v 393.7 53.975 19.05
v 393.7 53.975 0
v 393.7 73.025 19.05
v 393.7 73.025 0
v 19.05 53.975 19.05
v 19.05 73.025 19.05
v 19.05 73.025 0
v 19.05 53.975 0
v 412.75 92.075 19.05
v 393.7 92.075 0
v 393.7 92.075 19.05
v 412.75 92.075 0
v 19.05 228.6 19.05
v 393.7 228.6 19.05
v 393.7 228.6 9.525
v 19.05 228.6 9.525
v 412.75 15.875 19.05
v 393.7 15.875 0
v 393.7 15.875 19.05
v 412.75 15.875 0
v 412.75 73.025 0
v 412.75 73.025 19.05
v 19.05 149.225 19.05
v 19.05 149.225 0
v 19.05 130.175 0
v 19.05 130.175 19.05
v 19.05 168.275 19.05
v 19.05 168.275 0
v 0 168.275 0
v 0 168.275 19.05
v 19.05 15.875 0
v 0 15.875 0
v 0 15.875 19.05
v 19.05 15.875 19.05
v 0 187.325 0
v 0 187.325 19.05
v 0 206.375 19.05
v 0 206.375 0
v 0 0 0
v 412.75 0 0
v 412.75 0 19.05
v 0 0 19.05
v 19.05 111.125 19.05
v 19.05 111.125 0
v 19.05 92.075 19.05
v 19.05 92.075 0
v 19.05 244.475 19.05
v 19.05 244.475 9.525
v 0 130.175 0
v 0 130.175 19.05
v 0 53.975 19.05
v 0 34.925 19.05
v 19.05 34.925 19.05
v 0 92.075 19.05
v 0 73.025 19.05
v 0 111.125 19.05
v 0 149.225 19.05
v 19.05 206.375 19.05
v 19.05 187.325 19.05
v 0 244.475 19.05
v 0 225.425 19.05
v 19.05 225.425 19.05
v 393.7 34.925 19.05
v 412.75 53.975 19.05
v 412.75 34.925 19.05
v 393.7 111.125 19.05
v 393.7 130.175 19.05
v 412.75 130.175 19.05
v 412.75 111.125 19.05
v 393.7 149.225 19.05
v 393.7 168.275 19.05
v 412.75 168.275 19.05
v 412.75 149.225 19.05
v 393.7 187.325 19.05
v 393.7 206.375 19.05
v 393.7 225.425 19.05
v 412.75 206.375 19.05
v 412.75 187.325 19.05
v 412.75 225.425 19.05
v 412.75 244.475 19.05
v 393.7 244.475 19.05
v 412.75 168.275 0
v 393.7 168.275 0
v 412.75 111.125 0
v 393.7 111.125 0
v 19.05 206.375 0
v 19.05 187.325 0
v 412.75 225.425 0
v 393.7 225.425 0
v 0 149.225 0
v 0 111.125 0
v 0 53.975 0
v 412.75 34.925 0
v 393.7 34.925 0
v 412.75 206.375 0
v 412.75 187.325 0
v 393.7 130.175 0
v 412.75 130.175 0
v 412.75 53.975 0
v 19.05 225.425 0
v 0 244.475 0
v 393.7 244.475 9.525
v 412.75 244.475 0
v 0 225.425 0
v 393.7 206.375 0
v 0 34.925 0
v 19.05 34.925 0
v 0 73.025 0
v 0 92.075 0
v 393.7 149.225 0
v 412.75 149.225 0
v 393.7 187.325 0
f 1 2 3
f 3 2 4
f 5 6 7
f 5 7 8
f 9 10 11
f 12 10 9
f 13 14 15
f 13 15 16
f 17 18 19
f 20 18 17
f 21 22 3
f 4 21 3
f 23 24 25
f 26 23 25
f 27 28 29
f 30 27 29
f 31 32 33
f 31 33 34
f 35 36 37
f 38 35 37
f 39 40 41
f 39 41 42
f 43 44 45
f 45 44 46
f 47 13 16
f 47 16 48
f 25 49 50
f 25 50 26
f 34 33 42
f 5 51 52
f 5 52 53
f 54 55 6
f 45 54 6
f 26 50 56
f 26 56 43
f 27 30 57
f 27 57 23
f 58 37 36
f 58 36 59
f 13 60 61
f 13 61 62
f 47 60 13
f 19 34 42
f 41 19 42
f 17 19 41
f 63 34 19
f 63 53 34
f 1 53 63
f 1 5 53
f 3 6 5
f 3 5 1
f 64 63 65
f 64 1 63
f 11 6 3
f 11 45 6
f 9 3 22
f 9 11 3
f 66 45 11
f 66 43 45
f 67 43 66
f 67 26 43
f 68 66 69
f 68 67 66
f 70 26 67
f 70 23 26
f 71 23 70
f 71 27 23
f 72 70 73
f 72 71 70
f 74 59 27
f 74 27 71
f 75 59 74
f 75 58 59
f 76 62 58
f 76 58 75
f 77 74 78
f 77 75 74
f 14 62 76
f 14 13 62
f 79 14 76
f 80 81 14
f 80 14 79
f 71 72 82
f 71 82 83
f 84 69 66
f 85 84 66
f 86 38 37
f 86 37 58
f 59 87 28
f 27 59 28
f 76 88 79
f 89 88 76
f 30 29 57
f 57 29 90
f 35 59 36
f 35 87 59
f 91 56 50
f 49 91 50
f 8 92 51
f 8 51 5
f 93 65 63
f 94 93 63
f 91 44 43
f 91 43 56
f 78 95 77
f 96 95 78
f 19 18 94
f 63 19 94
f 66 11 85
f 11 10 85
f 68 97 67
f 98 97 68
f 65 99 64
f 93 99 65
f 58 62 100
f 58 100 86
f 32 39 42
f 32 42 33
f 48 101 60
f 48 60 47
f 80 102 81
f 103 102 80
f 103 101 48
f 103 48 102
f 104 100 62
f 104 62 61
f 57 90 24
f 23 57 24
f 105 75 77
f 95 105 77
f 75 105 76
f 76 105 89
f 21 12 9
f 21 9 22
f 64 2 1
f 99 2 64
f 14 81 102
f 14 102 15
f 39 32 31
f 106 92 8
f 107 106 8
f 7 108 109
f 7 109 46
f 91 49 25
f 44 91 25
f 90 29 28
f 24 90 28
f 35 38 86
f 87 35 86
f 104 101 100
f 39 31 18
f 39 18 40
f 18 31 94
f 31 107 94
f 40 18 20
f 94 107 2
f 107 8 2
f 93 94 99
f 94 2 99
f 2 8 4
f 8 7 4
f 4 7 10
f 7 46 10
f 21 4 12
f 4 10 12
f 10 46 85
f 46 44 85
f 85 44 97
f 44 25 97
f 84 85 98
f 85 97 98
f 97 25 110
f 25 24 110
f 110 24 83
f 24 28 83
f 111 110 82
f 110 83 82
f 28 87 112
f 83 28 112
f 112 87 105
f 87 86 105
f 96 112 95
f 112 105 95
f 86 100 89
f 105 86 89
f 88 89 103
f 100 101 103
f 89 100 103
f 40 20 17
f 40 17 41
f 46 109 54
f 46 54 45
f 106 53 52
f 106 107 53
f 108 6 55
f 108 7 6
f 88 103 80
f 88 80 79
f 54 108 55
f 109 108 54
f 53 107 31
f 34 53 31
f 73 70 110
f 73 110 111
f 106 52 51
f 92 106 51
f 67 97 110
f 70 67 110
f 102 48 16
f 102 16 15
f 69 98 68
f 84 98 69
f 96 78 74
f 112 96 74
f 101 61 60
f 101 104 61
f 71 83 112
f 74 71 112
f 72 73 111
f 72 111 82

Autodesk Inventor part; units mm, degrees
ref_plane "YZ Plane" through (0, 0, 0) normal (1, 0, 0) x (0, 1, 0)
ref_plane "XZ Plane" through (0, 0, 0) normal (0, 1, 0) x (-1, 0, 0)
ref_plane "XY Plane" through (0, 0, 0) normal (0, 0, 1) x (1, 0, 0)
sketch "Sketch1" plane through (0, 0, 0) normal (0, 0, 1) x (1, 0, 0)
  line L0 (0, 244.475) -> (19.05, 244.475)
  line L1 (19.05, 244.475) -> (19.05, 225.425)
  line L2 (19.05, 225.425) -> (0, 225.425)
  line L3 (0, 225.425) -> (0, 244.475)
  line L4 (19.05, 168.275) -> (0, 168.275)
  line L5 (0, 168.275) -> (0, 149.225)
  line L6 (0, 149.225) -> (19.05, 149.225)
  line L7 (19.05, 149.225) -> (19.05, 168.275)
  line L8 (0, 130.175) -> (19.05, 130.175)
  line L9 (19.05, 130.175) -> (19.05, 111.125)
  line L10 (19.05, 111.125) -> (0, 111.125)
  line L11 (0, 111.125) -> (0, 130.175)
  line L12 (0, 206.375) -> (19.05, 206.375)
  line L13 (19.05, 206.375) -> (19.05, 187.325)
  line L14 (19.05, 187.325) -> (0, 187.325)
  line L15 (0, 187.325) -> (0, 206.375)
  line L16 (0, 92.075) -> (19.05, 92.075)
  line L17 (19.05, 92.075) -> (19.05, 73.025)
  line L18 (19.05, 73.025) -> (0, 73.025)
  line L19 (0, 73.025) -> (0, 92.075)
  line L20 (0, 53.975) -> (19.05, 53.975)
  line L21 (19.05, 53.975) -> (19.05, 34.925)
  line L22 (19.05, 34.925) -> (0, 34.925)
  line L23 (0, 34.925) -> (0, 53.975)
  line L24 (0, 15.875) -> (19.05, 15.875)
  line L25 (19.05, 15.875) -> (19.05, -3.175)
  line L26 (19.05, -3.175) -> (0, -3.175)
  line L27 (0, -3.175) -> (0, 15.875)
  line L28 (0, 244.475) -> (206.375, 244.475)
  line L29 (206.375, 244.475) -> (206.375, 0)
  line L30 (206.375, 0) -> (0, 0)
  line L31 (19.05, 244.475) -> (19.05, 0)
  line L32 (206.375, 244.475) -> (19.05, 244.475)
  line L33 (19.05, 244.475) -> (19.05, 0)
  line L34 (19.05, 0) -> (206.375, 0)
  line L35 (206.375, 0) -> (206.375, 244.475)
  dimension "d0" = 19.05
  dimension "d1" = 19.05
  dimension "d3" = 19.05
  dimension "d4" = 19.05
  dimension "d5" = 19.05
  dimension "d6" = 19.05
  dimension "d7" = 19.05
  dimension "d8" = 19.05
  dimension "d9" = 19.05
  dimension "d10" = 19.05
  dimension "d11" = 19.05
  dimension "d12" = 19.05
  dimension "d13" = 19.05
  dimension "d14" = 19.05
  dimension "d15" = 19.05
  dimension "d16" = 19.05
  dimension "d17" = 19.05
  dimension "d18" = 19.05
  dimension "d19" = 19.05
  dimension "d21" = 206.375
  dimension "d22" = 244.475
  dimension "d23" = 206.375
extrude "Extrusion1" add sketch "Sketch1" along normal blind 19.05 contours L0 L1 L2 L3 | L28 L29 L30 L25 L31 L21 L17 L9 L7 L13 L1 | L13 L14 L15 L12 | L30 L27 L24 L25 | L7 L6 L5 L4 | L22 L23 L20 L21 | L9 L10 L11 L8 | L18 L19 L16 L17
mirror "Mirror1" about plane through (206.375, 0, 0) normal (1, 0, 0) of "Extrusion1"
sketch "Sketch2" plane through (0, 0, 19.05) normal (0, 0, 1) x (1, 0, 0)
  line L0 (412.75, 244.475) -> (412.75, 225.425) projected
  line L1 (0, 244.475) -> (412.75, 244.475) projected
  line L2 (0, 244.475) -> (0, 225.425) projected
  line L3 (19.05, 244.475) -> (393.7, 244.475)
  line L4 (393.7, 244.475) -> (393.7, 228.6)
  line L5 (393.7, 228.6) -> (19.05, 228.6)
  line L6 (19.05, 228.6) -> (19.05, 244.475)
  dimension "d26" = 19.05
  dimension "d27" = 19.05
  dimension "d28" = 15.875
extrude "Extrusion2" cut sketch "Sketch2" against normal blind 9.525
properties part number "deep_end" material "Wood (Birch)"
